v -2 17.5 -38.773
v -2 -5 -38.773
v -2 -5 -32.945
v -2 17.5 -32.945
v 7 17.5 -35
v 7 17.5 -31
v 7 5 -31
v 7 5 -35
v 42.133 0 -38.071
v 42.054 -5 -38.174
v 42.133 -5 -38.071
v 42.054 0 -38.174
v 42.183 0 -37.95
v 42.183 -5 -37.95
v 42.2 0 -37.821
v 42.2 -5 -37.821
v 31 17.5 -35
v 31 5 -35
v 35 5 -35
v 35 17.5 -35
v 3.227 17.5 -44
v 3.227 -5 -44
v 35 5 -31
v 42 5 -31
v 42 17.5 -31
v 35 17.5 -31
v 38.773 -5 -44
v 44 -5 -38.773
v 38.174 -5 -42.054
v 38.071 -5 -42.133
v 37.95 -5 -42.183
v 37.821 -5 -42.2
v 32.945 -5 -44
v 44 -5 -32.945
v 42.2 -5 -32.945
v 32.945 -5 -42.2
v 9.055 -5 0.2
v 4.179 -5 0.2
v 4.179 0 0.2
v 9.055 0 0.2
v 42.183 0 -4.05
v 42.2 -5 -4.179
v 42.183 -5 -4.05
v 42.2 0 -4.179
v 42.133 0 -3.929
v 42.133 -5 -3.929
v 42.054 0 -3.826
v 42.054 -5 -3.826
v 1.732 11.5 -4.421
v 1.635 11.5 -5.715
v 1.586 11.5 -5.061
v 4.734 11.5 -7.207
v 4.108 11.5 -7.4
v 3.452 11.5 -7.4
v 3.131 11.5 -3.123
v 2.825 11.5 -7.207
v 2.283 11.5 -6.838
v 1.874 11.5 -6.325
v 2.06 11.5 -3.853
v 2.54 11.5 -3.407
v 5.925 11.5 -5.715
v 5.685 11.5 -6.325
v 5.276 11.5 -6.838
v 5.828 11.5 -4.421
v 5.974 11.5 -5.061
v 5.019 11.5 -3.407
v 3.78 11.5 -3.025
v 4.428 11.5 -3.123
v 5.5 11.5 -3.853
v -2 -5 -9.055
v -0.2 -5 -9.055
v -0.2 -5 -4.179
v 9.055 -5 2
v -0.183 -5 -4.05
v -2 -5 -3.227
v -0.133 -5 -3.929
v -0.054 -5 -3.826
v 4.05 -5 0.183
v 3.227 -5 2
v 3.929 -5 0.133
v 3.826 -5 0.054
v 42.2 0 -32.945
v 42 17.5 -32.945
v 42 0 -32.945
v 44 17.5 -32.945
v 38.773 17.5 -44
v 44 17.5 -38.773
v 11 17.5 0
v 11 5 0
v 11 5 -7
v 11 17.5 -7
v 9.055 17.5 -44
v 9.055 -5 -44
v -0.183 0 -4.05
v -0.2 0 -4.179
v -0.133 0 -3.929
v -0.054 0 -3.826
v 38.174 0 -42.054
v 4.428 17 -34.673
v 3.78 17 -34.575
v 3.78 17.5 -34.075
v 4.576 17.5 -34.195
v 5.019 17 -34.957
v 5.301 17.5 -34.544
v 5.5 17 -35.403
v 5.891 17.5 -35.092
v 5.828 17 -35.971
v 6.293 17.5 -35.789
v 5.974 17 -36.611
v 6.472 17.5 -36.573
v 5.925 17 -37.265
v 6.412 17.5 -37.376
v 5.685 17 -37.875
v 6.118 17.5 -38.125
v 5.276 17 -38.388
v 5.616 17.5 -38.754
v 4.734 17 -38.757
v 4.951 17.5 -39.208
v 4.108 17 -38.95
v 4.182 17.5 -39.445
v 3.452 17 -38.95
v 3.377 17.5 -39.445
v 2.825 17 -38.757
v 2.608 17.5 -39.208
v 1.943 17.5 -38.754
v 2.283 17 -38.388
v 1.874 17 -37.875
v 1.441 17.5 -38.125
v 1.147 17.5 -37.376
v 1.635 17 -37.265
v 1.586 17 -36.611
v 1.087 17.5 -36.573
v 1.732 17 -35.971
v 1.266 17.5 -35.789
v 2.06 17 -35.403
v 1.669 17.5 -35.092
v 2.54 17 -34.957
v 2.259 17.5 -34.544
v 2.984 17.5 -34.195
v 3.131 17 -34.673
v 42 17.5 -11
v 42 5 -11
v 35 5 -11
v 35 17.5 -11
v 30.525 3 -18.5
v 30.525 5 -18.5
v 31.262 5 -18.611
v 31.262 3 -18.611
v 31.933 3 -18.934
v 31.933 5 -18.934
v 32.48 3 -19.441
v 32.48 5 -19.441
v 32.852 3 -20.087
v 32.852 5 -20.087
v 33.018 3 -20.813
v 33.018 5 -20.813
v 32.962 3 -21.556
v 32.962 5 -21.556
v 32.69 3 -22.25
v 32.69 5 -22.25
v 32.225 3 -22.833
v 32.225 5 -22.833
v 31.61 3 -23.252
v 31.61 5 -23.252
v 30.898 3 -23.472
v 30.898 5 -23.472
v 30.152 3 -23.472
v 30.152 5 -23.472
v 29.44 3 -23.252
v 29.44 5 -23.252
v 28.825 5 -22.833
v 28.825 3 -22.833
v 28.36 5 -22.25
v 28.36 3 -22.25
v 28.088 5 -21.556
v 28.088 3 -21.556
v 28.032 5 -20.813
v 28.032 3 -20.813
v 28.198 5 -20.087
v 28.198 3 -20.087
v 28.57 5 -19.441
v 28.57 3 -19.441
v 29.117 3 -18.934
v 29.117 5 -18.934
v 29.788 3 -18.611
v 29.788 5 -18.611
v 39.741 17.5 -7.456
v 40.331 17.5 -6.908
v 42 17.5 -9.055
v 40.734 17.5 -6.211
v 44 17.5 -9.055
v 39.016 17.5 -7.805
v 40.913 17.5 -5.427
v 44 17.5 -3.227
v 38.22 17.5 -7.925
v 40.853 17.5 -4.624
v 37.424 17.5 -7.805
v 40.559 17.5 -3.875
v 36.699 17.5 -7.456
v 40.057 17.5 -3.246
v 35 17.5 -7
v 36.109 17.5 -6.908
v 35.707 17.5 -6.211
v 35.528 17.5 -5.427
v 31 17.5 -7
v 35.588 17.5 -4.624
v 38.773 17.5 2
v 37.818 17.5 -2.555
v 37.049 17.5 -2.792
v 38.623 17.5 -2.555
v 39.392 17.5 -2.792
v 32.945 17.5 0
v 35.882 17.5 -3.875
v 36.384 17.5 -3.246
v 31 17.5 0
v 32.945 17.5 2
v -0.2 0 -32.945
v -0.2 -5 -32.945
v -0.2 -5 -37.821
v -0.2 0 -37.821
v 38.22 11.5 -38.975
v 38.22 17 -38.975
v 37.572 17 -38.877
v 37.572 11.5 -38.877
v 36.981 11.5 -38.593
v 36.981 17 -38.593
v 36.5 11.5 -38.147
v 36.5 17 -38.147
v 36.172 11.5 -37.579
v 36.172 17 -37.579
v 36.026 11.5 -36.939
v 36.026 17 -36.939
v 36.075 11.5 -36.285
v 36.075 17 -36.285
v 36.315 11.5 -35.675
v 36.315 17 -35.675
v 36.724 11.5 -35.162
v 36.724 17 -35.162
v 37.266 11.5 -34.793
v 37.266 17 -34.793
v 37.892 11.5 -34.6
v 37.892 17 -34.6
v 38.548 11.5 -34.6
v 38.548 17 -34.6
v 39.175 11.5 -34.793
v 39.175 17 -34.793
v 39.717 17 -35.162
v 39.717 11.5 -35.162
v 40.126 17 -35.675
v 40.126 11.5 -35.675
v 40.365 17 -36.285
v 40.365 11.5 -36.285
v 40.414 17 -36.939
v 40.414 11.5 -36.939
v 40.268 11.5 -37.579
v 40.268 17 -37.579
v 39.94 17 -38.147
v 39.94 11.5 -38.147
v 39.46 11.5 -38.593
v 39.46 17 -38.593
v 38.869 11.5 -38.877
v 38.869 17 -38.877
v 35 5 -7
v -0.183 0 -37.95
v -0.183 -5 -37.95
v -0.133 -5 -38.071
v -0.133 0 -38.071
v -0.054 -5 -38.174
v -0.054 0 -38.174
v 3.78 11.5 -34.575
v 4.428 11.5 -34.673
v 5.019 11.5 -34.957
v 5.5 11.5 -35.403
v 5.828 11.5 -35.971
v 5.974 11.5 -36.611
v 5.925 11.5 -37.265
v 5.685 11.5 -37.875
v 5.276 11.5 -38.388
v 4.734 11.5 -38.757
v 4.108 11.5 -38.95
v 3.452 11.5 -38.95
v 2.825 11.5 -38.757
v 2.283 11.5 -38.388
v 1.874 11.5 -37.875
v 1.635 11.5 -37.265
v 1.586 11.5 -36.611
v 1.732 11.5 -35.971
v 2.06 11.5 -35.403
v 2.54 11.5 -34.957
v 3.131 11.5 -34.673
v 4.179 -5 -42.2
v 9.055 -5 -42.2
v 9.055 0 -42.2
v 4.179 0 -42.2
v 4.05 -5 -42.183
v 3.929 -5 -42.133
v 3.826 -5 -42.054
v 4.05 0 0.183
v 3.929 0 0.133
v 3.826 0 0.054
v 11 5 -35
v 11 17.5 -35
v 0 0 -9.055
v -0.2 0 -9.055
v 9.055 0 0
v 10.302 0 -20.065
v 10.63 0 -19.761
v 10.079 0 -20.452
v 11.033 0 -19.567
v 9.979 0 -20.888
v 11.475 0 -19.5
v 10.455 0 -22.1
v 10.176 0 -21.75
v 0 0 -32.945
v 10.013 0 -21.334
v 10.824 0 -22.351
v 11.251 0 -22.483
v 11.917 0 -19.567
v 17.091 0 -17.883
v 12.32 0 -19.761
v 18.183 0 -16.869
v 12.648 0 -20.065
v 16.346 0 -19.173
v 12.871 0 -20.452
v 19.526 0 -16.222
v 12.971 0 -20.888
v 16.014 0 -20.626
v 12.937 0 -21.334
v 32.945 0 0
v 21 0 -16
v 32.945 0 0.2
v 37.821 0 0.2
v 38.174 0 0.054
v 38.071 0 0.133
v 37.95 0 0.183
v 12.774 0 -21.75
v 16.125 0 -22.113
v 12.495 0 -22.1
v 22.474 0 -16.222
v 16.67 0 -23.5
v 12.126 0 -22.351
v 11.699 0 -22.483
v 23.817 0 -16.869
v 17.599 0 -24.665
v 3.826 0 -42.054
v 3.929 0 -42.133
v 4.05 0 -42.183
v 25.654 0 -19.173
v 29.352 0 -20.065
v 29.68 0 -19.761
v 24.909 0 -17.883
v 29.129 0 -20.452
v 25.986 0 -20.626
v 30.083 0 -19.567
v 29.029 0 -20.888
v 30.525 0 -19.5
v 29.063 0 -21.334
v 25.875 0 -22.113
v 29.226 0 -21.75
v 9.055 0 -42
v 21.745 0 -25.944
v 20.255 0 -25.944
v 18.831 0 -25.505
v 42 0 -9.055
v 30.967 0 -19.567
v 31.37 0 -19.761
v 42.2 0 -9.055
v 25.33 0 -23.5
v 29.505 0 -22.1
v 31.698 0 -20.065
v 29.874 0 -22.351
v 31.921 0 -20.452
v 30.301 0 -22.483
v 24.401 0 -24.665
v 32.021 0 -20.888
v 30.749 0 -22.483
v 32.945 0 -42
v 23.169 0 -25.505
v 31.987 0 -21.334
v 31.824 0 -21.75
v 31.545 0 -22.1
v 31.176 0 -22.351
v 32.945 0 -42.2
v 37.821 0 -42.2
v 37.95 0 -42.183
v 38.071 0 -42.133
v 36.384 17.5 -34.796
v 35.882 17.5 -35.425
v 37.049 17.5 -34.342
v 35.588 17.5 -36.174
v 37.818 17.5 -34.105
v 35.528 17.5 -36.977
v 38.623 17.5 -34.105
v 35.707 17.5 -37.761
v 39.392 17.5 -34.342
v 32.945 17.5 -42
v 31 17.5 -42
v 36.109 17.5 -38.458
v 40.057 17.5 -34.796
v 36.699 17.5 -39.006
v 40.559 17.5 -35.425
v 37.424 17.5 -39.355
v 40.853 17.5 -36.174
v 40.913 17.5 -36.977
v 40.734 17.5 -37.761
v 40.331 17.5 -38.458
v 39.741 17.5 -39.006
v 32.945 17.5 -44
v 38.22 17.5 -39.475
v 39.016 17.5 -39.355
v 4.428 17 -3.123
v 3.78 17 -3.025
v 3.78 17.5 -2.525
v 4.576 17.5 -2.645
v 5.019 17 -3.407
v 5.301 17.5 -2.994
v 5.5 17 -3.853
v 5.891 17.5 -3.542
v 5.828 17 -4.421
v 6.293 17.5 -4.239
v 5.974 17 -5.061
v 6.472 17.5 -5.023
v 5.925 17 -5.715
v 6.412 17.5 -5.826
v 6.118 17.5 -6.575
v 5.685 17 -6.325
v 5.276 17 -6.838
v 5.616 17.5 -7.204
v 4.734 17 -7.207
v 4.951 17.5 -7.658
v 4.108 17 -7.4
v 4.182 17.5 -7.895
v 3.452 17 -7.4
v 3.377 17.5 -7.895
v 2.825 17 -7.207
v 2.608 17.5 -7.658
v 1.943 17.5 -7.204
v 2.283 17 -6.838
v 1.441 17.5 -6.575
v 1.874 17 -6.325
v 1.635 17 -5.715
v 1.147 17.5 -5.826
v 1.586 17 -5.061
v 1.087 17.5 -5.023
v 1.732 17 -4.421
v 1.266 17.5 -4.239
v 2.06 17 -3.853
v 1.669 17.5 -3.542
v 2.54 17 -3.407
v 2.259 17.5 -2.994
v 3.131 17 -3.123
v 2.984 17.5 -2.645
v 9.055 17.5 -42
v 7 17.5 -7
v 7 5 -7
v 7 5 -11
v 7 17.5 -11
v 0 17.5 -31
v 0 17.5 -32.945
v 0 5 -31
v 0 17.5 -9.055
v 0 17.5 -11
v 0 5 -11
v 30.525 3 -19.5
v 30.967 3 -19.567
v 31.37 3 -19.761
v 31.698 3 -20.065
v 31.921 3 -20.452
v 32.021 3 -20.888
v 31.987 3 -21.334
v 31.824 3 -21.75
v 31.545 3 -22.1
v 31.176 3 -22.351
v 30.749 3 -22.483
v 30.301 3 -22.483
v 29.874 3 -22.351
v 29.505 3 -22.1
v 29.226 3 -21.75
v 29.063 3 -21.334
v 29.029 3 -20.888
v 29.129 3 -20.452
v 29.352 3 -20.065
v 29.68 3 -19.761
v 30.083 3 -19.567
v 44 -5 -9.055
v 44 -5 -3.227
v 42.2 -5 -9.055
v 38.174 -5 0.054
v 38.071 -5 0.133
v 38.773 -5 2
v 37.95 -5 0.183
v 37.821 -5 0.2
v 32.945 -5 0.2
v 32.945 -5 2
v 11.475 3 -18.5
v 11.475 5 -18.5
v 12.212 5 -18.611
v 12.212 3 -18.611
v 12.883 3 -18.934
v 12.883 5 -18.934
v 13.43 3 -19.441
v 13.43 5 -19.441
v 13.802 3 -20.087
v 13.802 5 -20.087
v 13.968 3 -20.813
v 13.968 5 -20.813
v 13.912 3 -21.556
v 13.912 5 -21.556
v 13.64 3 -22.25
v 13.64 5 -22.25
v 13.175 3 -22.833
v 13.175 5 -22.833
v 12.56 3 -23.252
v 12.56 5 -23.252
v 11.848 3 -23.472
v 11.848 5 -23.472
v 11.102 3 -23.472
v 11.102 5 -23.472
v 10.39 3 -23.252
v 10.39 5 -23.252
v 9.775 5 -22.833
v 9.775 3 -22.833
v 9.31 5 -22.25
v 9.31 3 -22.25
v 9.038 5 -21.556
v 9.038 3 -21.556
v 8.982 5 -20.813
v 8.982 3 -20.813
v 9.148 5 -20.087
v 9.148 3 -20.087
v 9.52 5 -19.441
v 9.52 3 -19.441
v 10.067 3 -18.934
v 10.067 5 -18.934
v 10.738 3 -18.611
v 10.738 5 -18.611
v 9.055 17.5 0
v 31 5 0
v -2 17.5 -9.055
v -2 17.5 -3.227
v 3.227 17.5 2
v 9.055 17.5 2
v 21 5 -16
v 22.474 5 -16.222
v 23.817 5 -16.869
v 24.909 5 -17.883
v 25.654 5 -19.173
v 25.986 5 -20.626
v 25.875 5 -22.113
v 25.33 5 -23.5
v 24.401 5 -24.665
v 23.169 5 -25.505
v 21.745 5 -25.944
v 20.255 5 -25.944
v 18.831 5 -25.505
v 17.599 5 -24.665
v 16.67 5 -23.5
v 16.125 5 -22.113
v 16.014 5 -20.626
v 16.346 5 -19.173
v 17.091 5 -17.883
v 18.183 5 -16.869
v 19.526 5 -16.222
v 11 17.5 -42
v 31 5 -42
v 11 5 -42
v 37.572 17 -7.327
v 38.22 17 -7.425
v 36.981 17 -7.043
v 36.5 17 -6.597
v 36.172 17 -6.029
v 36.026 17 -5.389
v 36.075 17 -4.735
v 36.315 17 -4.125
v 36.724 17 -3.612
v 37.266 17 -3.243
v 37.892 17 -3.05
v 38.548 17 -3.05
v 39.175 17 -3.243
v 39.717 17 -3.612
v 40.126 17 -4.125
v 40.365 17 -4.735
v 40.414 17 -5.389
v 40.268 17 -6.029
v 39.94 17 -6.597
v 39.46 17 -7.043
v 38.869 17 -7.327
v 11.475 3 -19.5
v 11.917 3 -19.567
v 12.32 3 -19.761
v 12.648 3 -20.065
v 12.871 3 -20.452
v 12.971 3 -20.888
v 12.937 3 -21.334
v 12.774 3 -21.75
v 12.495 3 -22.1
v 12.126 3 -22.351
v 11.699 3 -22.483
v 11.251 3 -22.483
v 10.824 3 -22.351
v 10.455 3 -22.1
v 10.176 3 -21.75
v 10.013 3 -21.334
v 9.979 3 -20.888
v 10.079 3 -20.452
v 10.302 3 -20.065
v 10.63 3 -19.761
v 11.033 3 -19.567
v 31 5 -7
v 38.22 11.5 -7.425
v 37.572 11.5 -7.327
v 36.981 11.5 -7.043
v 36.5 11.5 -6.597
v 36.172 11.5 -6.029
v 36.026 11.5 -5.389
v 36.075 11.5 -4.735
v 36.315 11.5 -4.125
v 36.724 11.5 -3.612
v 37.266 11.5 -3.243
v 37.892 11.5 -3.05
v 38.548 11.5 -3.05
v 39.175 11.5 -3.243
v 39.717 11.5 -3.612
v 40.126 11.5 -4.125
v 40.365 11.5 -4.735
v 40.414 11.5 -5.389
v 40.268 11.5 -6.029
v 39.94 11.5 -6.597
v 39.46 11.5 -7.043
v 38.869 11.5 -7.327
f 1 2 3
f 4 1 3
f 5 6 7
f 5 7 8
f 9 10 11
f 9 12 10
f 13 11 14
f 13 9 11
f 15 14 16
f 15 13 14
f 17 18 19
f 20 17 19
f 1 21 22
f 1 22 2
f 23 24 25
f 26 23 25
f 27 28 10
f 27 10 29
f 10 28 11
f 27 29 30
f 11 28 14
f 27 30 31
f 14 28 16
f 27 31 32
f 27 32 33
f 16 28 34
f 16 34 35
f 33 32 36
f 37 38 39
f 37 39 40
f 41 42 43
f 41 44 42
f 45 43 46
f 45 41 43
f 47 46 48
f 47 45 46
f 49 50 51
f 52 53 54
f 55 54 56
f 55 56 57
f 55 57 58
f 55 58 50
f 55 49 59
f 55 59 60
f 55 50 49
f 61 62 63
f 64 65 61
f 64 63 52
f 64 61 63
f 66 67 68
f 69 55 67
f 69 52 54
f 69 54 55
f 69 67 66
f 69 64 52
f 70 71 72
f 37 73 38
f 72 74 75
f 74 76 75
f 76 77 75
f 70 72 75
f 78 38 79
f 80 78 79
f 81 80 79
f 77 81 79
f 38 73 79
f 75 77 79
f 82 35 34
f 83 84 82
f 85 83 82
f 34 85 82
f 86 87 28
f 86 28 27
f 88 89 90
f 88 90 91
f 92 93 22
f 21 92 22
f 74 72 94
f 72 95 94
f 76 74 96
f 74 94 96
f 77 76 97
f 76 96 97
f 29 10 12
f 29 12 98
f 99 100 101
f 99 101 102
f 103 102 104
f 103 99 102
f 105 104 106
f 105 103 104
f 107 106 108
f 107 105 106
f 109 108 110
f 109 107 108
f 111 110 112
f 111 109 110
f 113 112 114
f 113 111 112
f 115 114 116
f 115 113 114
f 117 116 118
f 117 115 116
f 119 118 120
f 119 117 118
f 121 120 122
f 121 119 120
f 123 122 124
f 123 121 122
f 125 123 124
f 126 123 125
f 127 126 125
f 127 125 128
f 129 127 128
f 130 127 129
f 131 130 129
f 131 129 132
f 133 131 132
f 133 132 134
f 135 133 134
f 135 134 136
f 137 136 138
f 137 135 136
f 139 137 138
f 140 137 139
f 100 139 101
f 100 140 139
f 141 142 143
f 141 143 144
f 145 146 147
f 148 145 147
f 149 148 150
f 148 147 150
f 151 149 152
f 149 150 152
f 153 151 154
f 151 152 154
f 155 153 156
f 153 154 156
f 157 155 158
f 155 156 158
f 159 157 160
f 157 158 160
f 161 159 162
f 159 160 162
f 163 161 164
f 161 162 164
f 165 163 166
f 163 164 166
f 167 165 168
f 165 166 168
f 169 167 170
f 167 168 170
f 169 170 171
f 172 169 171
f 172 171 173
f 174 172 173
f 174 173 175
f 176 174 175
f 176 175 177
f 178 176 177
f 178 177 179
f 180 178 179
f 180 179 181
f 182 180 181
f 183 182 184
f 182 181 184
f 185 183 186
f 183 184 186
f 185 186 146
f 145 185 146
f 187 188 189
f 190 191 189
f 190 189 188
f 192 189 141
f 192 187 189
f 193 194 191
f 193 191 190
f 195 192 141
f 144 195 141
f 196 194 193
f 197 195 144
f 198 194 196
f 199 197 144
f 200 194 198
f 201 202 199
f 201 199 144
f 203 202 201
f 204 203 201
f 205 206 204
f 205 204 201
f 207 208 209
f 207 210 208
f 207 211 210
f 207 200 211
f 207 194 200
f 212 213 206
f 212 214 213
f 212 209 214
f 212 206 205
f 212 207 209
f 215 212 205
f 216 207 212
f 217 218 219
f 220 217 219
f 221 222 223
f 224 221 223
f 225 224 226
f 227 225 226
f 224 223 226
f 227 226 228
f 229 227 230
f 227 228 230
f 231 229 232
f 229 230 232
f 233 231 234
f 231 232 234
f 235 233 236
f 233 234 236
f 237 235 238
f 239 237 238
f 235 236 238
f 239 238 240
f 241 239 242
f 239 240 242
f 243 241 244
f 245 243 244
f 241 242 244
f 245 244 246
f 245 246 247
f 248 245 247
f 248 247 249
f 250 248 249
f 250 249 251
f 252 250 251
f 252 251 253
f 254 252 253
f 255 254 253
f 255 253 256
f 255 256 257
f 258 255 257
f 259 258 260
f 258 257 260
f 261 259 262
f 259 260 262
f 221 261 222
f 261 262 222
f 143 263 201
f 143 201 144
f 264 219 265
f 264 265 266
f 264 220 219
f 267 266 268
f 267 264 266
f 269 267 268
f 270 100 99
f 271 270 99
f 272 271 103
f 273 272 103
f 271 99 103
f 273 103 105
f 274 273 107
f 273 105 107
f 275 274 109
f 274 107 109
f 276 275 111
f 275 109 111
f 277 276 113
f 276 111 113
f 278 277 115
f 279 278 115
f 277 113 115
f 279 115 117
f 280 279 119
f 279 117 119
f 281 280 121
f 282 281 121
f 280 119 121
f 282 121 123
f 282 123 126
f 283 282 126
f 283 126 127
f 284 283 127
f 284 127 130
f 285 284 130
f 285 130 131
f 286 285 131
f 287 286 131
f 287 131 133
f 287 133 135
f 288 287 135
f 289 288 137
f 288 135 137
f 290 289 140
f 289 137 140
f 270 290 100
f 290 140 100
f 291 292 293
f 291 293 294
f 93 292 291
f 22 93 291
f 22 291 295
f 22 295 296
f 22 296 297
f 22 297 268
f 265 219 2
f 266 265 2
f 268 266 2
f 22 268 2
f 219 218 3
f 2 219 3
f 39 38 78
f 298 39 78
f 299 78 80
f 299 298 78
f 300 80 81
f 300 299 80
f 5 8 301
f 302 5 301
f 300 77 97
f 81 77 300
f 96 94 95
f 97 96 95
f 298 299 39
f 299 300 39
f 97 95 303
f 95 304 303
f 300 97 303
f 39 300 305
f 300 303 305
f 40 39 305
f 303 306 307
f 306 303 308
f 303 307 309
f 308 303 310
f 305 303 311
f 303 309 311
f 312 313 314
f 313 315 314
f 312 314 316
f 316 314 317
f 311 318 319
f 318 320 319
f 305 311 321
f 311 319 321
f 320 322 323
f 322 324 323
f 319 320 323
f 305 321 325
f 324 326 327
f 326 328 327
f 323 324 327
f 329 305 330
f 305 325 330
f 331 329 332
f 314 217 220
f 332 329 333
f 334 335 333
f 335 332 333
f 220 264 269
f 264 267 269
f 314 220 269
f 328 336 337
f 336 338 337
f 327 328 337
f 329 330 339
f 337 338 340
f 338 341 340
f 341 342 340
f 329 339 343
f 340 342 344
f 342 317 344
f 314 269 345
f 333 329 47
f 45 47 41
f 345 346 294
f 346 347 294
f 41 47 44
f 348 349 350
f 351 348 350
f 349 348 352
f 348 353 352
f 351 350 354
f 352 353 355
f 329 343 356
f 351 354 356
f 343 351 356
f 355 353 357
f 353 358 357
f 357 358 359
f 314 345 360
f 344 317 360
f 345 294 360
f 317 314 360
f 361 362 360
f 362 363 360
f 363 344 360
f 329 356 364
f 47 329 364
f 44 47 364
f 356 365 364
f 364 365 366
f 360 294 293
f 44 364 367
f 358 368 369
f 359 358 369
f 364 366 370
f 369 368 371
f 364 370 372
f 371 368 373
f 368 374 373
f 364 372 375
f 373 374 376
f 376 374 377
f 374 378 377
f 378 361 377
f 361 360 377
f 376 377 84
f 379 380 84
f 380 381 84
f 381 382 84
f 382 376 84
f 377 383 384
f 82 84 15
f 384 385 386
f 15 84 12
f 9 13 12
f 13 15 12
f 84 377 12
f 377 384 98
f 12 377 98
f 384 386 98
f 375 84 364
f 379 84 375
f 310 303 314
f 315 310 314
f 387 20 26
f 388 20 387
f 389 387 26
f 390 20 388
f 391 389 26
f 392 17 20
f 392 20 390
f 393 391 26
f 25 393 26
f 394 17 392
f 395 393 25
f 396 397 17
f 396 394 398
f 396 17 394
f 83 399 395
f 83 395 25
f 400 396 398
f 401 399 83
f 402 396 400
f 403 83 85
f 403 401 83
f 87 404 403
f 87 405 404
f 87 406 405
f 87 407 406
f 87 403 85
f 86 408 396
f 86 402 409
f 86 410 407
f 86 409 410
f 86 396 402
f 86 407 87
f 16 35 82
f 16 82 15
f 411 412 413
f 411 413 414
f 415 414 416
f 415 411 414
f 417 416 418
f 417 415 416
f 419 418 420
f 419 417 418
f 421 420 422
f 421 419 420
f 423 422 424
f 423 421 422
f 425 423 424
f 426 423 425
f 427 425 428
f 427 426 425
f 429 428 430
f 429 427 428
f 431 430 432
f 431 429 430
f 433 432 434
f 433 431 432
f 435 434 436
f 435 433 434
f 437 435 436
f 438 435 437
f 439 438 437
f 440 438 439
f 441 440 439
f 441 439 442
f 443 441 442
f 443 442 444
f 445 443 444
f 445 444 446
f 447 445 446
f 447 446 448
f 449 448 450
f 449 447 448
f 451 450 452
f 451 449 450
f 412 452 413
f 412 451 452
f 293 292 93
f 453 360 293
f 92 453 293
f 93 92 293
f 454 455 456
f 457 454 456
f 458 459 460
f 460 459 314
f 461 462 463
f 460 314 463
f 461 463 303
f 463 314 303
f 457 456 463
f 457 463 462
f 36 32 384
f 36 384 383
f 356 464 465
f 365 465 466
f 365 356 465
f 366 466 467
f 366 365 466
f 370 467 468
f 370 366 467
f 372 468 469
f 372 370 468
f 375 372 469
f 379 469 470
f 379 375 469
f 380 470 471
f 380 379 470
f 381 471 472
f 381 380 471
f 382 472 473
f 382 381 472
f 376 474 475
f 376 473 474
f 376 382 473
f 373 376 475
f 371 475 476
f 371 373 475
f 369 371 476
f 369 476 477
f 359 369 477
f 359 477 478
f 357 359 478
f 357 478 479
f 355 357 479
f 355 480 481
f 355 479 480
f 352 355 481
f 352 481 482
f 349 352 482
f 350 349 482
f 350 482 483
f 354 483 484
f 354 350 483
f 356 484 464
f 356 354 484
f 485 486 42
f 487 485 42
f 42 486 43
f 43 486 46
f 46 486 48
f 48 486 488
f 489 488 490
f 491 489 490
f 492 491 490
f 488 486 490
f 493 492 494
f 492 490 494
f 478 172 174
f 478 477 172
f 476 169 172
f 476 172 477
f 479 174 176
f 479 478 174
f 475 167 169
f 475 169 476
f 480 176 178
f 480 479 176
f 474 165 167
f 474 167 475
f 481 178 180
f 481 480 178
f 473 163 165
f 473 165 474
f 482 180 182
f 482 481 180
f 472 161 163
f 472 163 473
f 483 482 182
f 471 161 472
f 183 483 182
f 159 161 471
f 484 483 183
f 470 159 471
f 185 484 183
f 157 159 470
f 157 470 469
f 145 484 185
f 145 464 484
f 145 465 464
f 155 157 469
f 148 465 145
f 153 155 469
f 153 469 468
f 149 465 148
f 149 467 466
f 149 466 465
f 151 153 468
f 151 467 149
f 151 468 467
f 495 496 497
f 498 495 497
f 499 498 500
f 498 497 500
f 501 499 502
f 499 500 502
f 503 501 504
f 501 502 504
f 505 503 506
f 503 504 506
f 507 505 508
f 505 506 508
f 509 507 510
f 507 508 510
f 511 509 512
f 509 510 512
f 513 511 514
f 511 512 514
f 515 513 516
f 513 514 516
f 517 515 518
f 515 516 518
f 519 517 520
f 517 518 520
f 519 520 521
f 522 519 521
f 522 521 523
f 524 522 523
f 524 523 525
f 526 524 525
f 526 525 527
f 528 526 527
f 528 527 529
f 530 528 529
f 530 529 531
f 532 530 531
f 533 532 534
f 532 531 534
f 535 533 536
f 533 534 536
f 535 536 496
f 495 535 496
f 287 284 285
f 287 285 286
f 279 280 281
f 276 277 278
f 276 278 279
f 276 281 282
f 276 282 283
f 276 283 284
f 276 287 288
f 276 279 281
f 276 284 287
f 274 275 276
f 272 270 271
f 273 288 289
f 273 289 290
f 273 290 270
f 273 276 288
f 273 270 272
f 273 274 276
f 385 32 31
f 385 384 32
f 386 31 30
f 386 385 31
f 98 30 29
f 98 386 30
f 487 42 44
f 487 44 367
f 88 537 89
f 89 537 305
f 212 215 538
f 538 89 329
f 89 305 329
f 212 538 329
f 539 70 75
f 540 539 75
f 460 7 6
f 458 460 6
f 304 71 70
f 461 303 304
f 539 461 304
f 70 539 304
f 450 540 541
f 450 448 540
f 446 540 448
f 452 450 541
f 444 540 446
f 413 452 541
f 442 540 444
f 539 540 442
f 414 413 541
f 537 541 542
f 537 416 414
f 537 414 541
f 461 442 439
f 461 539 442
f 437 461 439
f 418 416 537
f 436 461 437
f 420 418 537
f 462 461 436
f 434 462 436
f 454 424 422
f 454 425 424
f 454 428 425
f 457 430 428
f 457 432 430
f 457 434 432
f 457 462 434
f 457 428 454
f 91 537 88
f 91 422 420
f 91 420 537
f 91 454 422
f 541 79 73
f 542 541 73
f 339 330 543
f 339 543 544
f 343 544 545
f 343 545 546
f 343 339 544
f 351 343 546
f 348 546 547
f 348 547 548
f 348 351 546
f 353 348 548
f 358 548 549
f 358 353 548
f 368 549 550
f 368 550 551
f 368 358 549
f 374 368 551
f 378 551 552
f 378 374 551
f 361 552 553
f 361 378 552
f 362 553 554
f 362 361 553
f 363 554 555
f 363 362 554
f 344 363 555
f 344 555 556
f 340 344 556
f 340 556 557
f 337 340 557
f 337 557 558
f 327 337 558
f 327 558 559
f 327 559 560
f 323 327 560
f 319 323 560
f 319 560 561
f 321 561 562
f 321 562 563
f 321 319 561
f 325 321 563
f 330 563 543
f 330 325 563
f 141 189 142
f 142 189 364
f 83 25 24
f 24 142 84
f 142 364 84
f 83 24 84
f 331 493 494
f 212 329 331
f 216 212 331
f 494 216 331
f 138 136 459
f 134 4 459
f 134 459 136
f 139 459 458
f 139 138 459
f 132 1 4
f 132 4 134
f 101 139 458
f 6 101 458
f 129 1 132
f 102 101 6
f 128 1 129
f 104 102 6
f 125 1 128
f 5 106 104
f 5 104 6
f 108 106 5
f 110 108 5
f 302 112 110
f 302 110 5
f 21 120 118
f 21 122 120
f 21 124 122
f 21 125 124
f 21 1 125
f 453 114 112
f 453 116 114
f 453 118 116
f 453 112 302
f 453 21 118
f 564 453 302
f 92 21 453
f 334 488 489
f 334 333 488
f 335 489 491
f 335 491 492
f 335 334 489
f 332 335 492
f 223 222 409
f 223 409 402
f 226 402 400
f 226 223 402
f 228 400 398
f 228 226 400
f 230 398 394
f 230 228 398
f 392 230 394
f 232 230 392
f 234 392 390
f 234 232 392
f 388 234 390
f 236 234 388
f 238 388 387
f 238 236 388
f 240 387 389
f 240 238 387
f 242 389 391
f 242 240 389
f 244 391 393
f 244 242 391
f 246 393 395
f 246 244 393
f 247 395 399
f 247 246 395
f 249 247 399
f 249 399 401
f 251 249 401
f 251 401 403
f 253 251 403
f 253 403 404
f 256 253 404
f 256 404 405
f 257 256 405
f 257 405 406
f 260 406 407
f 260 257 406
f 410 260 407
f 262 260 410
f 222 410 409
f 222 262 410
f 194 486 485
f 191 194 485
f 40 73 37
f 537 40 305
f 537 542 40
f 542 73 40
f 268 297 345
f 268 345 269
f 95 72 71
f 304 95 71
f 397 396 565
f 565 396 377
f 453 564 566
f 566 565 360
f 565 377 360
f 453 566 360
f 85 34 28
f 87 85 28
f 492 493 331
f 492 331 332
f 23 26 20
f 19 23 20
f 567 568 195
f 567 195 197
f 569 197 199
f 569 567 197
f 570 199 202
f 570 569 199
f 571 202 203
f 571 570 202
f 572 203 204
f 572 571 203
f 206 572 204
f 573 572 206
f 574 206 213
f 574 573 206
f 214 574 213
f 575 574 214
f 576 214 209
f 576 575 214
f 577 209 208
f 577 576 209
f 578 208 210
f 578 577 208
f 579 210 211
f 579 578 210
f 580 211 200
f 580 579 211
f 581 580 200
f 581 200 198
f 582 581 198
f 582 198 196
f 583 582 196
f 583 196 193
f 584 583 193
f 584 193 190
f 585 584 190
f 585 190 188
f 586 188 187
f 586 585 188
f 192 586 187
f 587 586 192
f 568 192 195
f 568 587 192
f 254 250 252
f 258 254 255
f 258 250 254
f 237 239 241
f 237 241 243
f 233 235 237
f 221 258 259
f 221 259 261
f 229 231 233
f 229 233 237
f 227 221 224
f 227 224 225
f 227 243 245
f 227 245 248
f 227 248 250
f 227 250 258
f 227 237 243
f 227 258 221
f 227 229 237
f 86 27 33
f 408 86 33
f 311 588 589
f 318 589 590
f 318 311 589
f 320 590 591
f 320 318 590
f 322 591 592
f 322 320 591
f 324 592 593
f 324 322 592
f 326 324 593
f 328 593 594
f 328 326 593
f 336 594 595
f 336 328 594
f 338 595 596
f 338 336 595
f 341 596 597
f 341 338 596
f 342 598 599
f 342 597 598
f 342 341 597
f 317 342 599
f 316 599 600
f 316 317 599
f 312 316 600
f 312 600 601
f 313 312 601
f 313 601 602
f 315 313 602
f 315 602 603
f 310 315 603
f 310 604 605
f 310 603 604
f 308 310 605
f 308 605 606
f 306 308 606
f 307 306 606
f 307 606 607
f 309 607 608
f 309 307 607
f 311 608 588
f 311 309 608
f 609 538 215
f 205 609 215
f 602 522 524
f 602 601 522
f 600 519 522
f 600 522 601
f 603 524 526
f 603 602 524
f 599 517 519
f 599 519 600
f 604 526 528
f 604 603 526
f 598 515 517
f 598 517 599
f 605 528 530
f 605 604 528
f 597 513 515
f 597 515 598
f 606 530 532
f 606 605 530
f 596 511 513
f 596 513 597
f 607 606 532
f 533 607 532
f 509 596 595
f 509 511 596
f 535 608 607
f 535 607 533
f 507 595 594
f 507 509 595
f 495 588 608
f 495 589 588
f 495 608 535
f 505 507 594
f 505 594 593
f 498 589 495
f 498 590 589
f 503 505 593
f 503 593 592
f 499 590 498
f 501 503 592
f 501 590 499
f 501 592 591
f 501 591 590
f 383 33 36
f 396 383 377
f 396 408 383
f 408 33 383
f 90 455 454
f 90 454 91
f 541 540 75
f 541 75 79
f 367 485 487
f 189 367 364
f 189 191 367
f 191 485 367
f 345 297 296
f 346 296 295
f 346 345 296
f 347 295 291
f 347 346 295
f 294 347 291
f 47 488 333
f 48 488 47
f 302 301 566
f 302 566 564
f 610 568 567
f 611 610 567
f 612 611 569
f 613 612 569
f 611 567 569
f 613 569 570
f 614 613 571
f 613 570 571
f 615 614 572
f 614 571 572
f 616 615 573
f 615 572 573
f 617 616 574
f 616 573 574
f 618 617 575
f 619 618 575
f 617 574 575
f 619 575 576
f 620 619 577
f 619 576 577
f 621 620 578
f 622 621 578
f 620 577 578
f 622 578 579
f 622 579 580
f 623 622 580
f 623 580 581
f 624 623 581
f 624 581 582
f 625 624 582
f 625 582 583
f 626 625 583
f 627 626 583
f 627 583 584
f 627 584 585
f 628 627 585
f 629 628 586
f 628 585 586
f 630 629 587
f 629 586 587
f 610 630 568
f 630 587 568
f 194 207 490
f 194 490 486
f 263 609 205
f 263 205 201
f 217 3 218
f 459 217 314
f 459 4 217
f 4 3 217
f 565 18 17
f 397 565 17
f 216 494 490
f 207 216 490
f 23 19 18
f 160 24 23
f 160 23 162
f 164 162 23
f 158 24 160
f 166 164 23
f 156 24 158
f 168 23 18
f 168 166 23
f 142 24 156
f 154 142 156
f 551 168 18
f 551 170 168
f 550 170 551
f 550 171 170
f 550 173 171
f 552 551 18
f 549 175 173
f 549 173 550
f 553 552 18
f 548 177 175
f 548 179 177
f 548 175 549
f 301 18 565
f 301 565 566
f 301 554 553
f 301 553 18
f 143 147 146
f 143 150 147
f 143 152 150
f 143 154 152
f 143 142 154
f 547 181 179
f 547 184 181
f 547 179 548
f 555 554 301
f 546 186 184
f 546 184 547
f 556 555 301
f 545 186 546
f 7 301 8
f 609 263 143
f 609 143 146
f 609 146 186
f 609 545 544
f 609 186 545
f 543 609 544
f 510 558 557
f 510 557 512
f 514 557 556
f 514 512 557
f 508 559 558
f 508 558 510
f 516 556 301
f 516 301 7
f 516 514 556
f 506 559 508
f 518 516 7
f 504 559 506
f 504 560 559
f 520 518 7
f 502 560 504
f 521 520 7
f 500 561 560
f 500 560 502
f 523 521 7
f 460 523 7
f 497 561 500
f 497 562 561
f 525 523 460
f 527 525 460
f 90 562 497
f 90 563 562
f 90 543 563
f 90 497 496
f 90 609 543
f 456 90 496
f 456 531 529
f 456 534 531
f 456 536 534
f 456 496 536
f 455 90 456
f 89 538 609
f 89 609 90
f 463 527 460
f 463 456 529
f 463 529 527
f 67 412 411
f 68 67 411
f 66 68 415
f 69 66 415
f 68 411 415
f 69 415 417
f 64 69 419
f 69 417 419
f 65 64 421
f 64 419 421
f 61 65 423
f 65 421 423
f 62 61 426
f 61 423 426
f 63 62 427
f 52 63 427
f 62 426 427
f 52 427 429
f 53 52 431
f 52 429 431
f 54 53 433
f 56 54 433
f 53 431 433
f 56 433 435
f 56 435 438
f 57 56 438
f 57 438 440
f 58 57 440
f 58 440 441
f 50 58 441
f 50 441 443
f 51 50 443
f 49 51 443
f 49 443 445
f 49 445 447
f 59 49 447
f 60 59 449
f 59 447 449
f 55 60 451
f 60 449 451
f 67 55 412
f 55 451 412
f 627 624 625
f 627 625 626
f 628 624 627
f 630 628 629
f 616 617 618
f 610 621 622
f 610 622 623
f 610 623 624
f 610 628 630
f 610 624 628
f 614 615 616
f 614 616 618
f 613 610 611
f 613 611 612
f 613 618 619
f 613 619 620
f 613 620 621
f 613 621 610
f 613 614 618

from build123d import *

# Parameters (mm, degrees)
SKETCH1_R               = 1.5
SKETCH1_R_2             = 5
BOSS_EXTRUDE1_DEPTH     = 5
SKETCH2_W               = 28
SKETCH2_H               = 28
BOSS_EXTRUDE2_DEPTH     = 12.5
SKETCH3_R               = 2.2
CUT_EXTRUDE1_DEPTH      = 6
CUT_EXTRUDE2_DEPTH      = 62.921321045
CUT_EXTRUDE2_DEPTH_BACK = 62.921321045
SKETCH4_W               = 20
SKETCH4_H               = 23.078544061
CUT_EXTRUDE3_DEPTH      = 62.921321045
CUT_EXTRUDE3_DEPTH_BACK = 62.921321045
SKETCH5_W               = 20
SKETCH5_H               = 13.366359074
BOSS_EXTRUDE3_START     = -17.5
BOSS_EXTRUDE3_DEPTH     = 22.5
SKETCH8_R               = 2.5
CUT_EXTRUDE4_DEPTH      = 2
CUT_EXTRUDE5_DEPTH      = 5
FILLET1_R               = 0.5
CHAMFER1_SIZE           = 0.5


with BuildPart() as part:
    # Sketch1 → Boss-Extrude1 (new body)
    with BuildSketch(Plane(origin=(0, 0, 0), x_dir=(1, 0, 0), z_dir=(0, 1, 0))):
        Polygon((4.055, 0), (37.945, 0), (42, 4.055), (42, 37.945), (37.945, 42), (4.055, 42), (0, 37.945), (0, 4.055), align=None)
        with Locations(Location((11.475, 21, 0), (0, 0, 270))):
            Circle(SKETCH1_R, mode=Mode.SUBTRACT)
        with Locations(Location((30.525, 21, 0), (0, 0, 270))):
            Circle(SKETCH1_R, mode=Mode.SUBTRACT)
        with Locations(Location((21, 21, 0), (0, 0, 270))):
            Circle(SKETCH1_R_2, mode=Mode.SUBTRACT)
    extrude(amount=BOSS_EXTRUDE1_DEPTH)

    # Sketch2 → Boss-Extrude2 (add)
    with BuildSketch(Plane(origin=(0, 5, 0), x_dir=(1, 0, 0), z_dir=(0, 1, 0))):
        Polygon((37.945, 42), (4.055, 42), (0, 37.945), (0, 4.055), (4.055, 0), (37.945, 0), (42, 4.055), (42, 37.945), align=None)
        with Locations((21, 21)):
            Rectangle(SKETCH2_W, SKETCH2_H, mode=Mode.SUBTRACT)
    extrude(amount=BOSS_EXTRUDE2_DEPTH)

    # Sketch3 → Cut-Extrude1 (cut)
    with BuildSketch(Plane(origin=(0, 17.5, 0), x_dir=(1, 0, 0), z_dir=(0, 1, 0))):
        with Locations(Location((3.779747468, 36.775, 0), (0, 0, 270))):
            Circle(SKETCH3_R)
        with Locations(Location((3.779747468, 5.225, 0), (0, 0, 270))):
            Circle(SKETCH3_R)
        with Locations(Location((38.220252532, 5.225, 0), (0, 0, 90))):
            Circle(SKETCH3_R)
        with Locations(Location((38.220252532, 36.775, 0), (0, 0, 90))):
            Circle(SKETCH3_R)
    extrude(amount=-CUT_EXTRUDE1_DEPTH, mode=Mode.SUBTRACT)

    # Sketch4 → Cut-Extrude2 (cut, two sides: drawn at the far end of the back side and taken through both)
    with BuildSketch(Plane.ZY.offset(-CUT_EXTRUDE2_DEPTH_BACK)):
        with Locations((-21, 16.539272031)):
            Rectangle(SKETCH4_W, SKETCH4_H)
    extrude(amount=CUT_EXTRUDE2_DEPTH + CUT_EXTRUDE2_DEPTH_BACK, mode=Mode.SUBTRACT)

    # Sketch5 → Cut-Extrude3 (cut, two sides: drawn at the far end of the back side and taken through both)
    with BuildSketch(Plane(origin=(0, 0, -42), x_dir=(-1, 0, 0), z_dir=(0, 0, -1)).offset(-CUT_EXTRUDE3_DEPTH_BACK)):
        with Locations((-21, 11.683179537)):
            Rectangle(SKETCH5_W, SKETCH5_H)
    extrude(amount=CUT_EXTRUDE3_DEPTH + CUT_EXTRUDE3_DEPTH_BACK, mode=Mode.SUBTRACT)

    # Sketch7 → Boss-Extrude3 (add)
    with BuildSketch(Plane.XZ.offset(BOSS_EXTRUDE3_START)):
        Polygon((37.945, 0), (32.945, 0), (32.945, 2), (38.773427125, 2), (44, -3.226572875), (44, -9.055), (42, -9.055), (42, -4.055), align=None)
        Polygon((4.055, 0), (0, -4.055), (0, -9.055), (-2, -9.055), (-2, -3.226572875), (3.226572875, 2), (9.055, 2), (9.055, 0), align=None)
        Polygon((0, -37.945), (4.055, -42), (9.055, -42), (9.055, -44), (3.226572875, -44), (-2, -38.773427125), (-2, -32.945), (0, -32.945), align=None)
        Polygon((37.945, -42), (42, -37.945), (42, -32.945), (44, -32.945), (44, -38.773427125), (38.773427125, -44), (32.945, -44), (32.945, -42), align=None)
    extrude(amount=BOSS_EXTRUDE3_DEPTH)

    # Sketch8 → Cut-Extrude4 (cut)
    with BuildSketch(Plane(origin=(0, 5, 0), x_dir=(1, 0, 0), z_dir=(0, 1, 0))):
        with Locations(Location((11.475, 21, 0), (0, 0, 270))):
            Circle(SKETCH8_R)
        with Locations(Location((30.525, 21, 0), (0, 0, 270))):
            Circle(SKETCH8_R)
    extrude(amount=-CUT_EXTRUDE4_DEPTH, mode=Mode.SUBTRACT)

    # Sketch9 → Cut-Extrude5 (cut)
    with BuildSketch(Plane.XZ.offset(5)):
        Polygon((-0.2, -9.055), (-0.2, -3.972157288), (3.972157288, 0.2), (38.027842712, 0.2), (42.2, -3.972157288), (42.2, -38.027842712), (38.027842712, -42.2), (3.972157288, -42.2), (-0.2, -38.027842712), align=None)
    extrude(amount=-CUT_EXTRUDE5_DEPTH, mode=Mode.SUBTRACT)

    # Fillet1
    fillet1_edges = [part.edges().sort_by_distance(p)[0] for p in [
        (3.972157288, -2.5, 0.2),
        (-0.2, -2.5, -38.027842712),
        (-0.2, -2.5, -3.972157288),
        (38.027842712, -2.5, 0.2),
        (42.2, -2.5, -3.972157288),
        (42.2, -2.5, -38.027842712),
        (38.027842712, -2.5, -42.2),
        (3.972157288, -2.5, -42.2),
    ]]
    fillet(fillet1_edges, radius=FILLET1_R)

    # Chamfer1
    chamfer1_edges = [part.edges().sort_by_distance(p)[0] for p in [
        (38.220252532, 17.5, -34.575),
        (38.220252532, 17.5, -3.025),
        (3.779747468, 17.5, -7.425),
        (3.779747468, 17.5, -38.975),
    ]]
    chamfer(chamfer1_edges, length=CHAMFER1_SIZE)


solid = part.part
